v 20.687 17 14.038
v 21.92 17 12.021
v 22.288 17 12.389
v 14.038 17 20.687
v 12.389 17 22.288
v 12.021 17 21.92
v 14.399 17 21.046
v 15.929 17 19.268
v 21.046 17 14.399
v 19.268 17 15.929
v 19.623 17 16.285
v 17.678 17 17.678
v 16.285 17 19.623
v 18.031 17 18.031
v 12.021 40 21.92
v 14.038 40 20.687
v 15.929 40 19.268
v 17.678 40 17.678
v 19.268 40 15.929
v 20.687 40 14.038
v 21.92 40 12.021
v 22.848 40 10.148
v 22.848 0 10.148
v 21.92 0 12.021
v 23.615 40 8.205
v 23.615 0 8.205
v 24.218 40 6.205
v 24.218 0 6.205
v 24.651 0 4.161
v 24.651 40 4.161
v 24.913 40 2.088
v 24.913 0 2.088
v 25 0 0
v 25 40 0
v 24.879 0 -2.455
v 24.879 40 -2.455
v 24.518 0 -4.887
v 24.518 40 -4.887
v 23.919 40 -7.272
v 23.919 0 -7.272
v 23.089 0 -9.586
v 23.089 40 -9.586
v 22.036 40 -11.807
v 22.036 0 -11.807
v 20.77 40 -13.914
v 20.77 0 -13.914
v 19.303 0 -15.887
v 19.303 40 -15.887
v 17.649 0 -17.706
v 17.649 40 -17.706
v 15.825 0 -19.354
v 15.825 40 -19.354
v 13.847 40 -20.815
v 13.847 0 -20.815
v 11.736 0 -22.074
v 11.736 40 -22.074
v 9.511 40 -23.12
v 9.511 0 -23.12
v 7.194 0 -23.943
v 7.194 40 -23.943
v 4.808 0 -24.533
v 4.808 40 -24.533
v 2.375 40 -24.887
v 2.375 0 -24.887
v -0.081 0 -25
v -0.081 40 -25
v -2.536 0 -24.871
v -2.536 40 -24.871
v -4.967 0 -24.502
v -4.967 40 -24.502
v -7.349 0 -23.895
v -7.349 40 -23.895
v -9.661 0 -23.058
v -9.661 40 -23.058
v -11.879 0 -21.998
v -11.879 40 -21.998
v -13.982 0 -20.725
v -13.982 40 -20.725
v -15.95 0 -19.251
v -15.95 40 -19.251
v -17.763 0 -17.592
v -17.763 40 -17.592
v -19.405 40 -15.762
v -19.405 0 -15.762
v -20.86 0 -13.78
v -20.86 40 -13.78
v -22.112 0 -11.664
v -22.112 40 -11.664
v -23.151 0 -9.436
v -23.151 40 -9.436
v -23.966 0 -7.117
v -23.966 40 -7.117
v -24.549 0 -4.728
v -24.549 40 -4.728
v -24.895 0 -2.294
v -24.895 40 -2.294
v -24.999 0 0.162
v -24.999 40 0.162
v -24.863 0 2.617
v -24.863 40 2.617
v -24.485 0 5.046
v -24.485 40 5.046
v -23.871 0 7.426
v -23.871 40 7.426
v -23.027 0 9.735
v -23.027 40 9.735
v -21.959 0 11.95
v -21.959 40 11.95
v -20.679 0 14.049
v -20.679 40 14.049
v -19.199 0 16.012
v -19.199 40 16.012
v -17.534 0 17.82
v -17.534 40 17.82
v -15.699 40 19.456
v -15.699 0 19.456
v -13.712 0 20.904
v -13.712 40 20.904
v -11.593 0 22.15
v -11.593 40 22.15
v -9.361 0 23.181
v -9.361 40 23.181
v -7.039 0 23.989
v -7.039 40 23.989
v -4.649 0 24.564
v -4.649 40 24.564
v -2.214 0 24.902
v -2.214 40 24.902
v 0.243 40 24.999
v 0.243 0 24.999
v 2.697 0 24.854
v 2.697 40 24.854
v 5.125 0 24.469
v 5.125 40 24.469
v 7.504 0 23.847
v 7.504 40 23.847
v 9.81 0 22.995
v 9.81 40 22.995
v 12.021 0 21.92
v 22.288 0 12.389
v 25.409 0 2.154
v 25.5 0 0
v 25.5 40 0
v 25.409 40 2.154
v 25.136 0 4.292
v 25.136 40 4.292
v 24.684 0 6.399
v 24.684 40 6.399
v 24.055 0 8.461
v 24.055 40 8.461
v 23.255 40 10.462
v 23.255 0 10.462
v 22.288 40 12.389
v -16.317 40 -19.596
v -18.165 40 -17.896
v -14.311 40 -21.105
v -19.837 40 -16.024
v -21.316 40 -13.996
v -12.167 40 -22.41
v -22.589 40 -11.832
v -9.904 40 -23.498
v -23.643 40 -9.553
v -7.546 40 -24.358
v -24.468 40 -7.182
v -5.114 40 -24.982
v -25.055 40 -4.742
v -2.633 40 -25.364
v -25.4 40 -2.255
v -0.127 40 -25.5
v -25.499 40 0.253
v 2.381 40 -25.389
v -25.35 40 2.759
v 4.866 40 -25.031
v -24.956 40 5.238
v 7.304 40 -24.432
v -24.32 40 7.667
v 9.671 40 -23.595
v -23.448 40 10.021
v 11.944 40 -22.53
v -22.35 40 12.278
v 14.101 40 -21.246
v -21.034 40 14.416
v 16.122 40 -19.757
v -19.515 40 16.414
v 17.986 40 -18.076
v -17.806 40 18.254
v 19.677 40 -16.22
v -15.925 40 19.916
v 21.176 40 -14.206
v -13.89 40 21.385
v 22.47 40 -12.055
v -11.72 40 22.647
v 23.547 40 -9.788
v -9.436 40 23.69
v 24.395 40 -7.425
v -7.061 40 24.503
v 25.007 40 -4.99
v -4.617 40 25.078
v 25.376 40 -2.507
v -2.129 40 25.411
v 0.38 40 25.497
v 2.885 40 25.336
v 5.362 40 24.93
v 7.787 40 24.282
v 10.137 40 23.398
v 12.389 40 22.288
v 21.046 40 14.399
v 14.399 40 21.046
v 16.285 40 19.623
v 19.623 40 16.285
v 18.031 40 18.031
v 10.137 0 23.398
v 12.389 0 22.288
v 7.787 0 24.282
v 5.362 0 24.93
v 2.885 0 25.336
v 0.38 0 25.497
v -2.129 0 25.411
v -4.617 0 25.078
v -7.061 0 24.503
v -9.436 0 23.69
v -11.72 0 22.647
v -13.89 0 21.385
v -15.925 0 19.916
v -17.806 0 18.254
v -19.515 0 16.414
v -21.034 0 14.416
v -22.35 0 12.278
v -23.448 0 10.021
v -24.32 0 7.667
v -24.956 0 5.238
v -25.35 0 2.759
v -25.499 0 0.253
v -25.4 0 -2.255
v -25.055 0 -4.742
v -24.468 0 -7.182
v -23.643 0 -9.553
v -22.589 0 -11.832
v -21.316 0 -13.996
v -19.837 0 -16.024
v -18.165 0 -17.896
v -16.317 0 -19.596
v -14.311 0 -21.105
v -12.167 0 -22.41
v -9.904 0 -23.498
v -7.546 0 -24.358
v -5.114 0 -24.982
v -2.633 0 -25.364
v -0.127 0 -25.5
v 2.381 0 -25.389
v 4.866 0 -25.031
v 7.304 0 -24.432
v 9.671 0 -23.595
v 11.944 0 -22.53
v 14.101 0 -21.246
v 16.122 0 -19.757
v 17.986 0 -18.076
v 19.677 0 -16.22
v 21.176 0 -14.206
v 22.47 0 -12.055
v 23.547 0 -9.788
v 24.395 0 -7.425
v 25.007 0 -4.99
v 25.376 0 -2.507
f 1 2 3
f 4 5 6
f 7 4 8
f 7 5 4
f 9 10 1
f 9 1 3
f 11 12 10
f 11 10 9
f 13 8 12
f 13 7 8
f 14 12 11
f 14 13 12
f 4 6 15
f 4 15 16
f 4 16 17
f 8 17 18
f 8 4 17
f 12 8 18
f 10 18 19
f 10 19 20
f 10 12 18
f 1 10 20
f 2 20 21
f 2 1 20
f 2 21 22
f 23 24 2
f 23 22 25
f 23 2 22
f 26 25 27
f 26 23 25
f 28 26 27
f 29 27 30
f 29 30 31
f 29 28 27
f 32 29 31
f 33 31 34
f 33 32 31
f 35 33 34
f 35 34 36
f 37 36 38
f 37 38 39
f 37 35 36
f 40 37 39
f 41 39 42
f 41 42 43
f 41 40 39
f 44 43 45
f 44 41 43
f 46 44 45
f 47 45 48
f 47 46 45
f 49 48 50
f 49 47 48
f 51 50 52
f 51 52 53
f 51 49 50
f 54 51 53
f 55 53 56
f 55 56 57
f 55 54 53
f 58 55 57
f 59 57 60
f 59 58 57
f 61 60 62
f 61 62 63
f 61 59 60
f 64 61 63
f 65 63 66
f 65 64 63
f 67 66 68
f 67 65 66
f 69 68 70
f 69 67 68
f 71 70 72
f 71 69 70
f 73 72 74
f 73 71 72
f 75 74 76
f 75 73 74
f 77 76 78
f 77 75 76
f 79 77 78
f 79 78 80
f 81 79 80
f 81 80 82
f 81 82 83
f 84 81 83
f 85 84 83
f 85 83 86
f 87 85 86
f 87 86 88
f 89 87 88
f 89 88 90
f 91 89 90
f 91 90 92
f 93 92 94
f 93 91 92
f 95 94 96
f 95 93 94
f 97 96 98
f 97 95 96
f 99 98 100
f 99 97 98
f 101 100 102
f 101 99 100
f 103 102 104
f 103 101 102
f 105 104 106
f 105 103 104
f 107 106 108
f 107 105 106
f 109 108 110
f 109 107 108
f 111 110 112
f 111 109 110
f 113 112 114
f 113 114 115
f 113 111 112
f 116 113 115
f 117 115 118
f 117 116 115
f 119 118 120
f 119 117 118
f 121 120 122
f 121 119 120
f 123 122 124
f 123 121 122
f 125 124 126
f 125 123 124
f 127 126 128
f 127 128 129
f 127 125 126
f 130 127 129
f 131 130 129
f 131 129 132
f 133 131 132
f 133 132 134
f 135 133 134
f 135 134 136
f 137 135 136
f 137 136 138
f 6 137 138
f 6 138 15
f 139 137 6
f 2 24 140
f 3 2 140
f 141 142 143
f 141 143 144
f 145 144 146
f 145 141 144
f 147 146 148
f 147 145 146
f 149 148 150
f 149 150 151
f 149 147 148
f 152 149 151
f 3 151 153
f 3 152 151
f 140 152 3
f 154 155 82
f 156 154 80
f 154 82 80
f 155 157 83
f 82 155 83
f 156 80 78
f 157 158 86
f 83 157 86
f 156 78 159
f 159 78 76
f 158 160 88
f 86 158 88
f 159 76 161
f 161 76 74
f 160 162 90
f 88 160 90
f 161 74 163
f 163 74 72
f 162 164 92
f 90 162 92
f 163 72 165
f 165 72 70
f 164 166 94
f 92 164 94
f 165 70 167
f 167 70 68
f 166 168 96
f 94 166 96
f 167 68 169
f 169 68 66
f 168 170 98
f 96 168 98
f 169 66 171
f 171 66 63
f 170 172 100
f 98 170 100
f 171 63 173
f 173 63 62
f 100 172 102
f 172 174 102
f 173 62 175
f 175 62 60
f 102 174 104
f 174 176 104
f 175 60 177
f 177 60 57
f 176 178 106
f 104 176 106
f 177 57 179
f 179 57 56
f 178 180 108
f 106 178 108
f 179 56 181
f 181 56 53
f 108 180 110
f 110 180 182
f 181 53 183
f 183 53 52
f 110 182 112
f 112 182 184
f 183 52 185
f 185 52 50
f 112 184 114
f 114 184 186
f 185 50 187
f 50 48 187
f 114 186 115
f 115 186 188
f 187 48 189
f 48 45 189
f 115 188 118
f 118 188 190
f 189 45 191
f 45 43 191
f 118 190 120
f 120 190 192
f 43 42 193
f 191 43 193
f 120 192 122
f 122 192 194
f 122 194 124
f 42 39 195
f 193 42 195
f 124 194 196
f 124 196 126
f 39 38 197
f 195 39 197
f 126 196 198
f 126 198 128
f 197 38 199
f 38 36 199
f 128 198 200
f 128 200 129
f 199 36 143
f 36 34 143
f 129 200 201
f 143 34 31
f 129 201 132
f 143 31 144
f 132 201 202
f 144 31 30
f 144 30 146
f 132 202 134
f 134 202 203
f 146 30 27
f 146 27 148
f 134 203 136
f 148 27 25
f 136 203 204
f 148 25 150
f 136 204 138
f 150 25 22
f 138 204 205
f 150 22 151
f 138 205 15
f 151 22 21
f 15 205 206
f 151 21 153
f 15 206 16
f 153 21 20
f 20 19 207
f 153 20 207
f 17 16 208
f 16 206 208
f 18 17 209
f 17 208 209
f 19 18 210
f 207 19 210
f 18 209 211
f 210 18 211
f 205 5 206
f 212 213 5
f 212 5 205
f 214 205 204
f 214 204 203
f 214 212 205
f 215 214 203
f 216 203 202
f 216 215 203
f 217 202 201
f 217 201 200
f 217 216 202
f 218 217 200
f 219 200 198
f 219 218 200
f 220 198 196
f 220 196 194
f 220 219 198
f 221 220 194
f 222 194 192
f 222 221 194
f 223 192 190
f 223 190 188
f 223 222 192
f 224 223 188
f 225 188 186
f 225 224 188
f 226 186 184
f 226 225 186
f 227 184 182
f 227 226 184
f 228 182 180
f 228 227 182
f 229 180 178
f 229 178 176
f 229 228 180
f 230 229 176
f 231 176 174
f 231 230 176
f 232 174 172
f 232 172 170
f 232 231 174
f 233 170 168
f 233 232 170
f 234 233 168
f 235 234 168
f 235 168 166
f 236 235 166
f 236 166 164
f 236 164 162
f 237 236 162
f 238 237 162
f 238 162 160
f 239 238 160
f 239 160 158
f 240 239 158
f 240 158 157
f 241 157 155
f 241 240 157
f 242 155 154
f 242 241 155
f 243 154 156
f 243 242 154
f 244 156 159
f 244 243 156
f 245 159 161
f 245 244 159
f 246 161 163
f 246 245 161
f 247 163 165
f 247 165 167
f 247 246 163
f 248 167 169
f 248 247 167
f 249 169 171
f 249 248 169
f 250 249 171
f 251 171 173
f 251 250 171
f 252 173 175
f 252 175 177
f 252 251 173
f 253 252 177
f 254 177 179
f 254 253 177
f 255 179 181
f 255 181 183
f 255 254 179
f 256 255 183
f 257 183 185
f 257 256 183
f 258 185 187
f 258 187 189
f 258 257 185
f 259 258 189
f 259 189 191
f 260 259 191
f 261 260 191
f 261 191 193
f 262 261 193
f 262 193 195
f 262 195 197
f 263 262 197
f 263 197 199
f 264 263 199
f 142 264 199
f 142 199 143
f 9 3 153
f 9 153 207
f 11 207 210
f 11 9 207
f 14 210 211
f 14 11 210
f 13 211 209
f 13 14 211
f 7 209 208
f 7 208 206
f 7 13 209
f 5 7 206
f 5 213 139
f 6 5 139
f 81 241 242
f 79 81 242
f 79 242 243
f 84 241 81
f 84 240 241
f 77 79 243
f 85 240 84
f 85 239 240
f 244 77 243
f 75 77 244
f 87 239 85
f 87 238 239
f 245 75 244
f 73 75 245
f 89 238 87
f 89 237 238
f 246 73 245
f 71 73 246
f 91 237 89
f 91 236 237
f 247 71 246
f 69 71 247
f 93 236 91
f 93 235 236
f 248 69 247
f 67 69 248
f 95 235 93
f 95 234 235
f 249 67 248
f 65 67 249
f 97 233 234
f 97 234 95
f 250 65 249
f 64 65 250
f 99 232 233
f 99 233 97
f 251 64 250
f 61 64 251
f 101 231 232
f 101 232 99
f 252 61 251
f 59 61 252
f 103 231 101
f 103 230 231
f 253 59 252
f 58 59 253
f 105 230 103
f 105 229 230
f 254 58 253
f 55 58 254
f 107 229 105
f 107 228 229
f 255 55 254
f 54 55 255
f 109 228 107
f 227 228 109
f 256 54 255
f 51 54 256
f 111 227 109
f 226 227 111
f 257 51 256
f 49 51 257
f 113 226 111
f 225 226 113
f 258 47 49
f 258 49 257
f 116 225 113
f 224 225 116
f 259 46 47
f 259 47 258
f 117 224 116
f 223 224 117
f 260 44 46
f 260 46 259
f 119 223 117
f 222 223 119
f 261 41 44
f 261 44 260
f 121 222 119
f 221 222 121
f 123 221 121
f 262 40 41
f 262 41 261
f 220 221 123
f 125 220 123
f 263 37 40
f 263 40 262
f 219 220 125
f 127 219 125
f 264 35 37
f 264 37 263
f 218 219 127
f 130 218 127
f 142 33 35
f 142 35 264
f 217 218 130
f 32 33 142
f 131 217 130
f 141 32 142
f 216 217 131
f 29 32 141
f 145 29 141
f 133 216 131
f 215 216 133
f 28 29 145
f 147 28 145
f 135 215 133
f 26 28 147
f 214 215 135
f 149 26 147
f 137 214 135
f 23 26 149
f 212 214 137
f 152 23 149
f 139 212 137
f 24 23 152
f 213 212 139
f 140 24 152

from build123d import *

# Parameters (mm, degrees)
F1_DEPTH = 40
F2_DEPTH = 40
F3_DEPTH = 17


with BuildPart() as f1:
    # F0 (on Front) → F1 (new body)
    with BuildSketch(Plane.XZ):
        with BuildLine():
            ThreePointArc((21.92031, 12.020815), (24.217842, 6.204524), (25, 0))
            ThreePointArc((25, 0), (-21.511862, -12.737339), (12.020815, 21.92031))
            Line((12.020815, 21.92031), (12.388793, 22.288288))
            ThreePointArc((12.388793, 22.288288), (-21.979129, -12.929342), (25.5, 0))
            ThreePointArc((25.5, 0), (24.684017, 6.399166), (22.288288, 12.388793))
            Line((22.288288, 12.388793), (21.92031, 12.020815))
        make_face()
    extrude(amount=-F1_DEPTH)

    # F0 (on Front) → F2 (join)
    with BuildSketch(Plane.XZ):
        with BuildLine():
            ThreePointArc((12.020815, 21.92031), (17.67767, 17.67767), (21.92031, 12.020815))
            Line((21.92031, 12.020815), (22.288288, 12.388793))
            ThreePointArc((22.288288, 12.388793), (18.031223, 18.031223), (12.388793, 22.288288))
            Line((12.388793, 22.288288), (12.020815, 21.92031))
        make_face()
    extrude(amount=-F2_DEPTH)

    # F0 (on Front) → F3 (cut)
    with BuildSketch(Plane.XZ):
        with BuildLine():
            ThreePointArc((12.020815, 21.92031), (17.67767, 17.67767), (21.92031, 12.020815))
            Line((21.92031, 12.020815), (22.288288, 12.388793))
            ThreePointArc((22.288288, 12.388793), (18.031223, 18.031223), (12.388793, 22.288288))
            Line((12.388793, 22.288288), (12.020815, 21.92031))
        make_face()
    extrude(amount=-F3_DEPTH, mode=Mode.SUBTRACT)


solid = f1.part
